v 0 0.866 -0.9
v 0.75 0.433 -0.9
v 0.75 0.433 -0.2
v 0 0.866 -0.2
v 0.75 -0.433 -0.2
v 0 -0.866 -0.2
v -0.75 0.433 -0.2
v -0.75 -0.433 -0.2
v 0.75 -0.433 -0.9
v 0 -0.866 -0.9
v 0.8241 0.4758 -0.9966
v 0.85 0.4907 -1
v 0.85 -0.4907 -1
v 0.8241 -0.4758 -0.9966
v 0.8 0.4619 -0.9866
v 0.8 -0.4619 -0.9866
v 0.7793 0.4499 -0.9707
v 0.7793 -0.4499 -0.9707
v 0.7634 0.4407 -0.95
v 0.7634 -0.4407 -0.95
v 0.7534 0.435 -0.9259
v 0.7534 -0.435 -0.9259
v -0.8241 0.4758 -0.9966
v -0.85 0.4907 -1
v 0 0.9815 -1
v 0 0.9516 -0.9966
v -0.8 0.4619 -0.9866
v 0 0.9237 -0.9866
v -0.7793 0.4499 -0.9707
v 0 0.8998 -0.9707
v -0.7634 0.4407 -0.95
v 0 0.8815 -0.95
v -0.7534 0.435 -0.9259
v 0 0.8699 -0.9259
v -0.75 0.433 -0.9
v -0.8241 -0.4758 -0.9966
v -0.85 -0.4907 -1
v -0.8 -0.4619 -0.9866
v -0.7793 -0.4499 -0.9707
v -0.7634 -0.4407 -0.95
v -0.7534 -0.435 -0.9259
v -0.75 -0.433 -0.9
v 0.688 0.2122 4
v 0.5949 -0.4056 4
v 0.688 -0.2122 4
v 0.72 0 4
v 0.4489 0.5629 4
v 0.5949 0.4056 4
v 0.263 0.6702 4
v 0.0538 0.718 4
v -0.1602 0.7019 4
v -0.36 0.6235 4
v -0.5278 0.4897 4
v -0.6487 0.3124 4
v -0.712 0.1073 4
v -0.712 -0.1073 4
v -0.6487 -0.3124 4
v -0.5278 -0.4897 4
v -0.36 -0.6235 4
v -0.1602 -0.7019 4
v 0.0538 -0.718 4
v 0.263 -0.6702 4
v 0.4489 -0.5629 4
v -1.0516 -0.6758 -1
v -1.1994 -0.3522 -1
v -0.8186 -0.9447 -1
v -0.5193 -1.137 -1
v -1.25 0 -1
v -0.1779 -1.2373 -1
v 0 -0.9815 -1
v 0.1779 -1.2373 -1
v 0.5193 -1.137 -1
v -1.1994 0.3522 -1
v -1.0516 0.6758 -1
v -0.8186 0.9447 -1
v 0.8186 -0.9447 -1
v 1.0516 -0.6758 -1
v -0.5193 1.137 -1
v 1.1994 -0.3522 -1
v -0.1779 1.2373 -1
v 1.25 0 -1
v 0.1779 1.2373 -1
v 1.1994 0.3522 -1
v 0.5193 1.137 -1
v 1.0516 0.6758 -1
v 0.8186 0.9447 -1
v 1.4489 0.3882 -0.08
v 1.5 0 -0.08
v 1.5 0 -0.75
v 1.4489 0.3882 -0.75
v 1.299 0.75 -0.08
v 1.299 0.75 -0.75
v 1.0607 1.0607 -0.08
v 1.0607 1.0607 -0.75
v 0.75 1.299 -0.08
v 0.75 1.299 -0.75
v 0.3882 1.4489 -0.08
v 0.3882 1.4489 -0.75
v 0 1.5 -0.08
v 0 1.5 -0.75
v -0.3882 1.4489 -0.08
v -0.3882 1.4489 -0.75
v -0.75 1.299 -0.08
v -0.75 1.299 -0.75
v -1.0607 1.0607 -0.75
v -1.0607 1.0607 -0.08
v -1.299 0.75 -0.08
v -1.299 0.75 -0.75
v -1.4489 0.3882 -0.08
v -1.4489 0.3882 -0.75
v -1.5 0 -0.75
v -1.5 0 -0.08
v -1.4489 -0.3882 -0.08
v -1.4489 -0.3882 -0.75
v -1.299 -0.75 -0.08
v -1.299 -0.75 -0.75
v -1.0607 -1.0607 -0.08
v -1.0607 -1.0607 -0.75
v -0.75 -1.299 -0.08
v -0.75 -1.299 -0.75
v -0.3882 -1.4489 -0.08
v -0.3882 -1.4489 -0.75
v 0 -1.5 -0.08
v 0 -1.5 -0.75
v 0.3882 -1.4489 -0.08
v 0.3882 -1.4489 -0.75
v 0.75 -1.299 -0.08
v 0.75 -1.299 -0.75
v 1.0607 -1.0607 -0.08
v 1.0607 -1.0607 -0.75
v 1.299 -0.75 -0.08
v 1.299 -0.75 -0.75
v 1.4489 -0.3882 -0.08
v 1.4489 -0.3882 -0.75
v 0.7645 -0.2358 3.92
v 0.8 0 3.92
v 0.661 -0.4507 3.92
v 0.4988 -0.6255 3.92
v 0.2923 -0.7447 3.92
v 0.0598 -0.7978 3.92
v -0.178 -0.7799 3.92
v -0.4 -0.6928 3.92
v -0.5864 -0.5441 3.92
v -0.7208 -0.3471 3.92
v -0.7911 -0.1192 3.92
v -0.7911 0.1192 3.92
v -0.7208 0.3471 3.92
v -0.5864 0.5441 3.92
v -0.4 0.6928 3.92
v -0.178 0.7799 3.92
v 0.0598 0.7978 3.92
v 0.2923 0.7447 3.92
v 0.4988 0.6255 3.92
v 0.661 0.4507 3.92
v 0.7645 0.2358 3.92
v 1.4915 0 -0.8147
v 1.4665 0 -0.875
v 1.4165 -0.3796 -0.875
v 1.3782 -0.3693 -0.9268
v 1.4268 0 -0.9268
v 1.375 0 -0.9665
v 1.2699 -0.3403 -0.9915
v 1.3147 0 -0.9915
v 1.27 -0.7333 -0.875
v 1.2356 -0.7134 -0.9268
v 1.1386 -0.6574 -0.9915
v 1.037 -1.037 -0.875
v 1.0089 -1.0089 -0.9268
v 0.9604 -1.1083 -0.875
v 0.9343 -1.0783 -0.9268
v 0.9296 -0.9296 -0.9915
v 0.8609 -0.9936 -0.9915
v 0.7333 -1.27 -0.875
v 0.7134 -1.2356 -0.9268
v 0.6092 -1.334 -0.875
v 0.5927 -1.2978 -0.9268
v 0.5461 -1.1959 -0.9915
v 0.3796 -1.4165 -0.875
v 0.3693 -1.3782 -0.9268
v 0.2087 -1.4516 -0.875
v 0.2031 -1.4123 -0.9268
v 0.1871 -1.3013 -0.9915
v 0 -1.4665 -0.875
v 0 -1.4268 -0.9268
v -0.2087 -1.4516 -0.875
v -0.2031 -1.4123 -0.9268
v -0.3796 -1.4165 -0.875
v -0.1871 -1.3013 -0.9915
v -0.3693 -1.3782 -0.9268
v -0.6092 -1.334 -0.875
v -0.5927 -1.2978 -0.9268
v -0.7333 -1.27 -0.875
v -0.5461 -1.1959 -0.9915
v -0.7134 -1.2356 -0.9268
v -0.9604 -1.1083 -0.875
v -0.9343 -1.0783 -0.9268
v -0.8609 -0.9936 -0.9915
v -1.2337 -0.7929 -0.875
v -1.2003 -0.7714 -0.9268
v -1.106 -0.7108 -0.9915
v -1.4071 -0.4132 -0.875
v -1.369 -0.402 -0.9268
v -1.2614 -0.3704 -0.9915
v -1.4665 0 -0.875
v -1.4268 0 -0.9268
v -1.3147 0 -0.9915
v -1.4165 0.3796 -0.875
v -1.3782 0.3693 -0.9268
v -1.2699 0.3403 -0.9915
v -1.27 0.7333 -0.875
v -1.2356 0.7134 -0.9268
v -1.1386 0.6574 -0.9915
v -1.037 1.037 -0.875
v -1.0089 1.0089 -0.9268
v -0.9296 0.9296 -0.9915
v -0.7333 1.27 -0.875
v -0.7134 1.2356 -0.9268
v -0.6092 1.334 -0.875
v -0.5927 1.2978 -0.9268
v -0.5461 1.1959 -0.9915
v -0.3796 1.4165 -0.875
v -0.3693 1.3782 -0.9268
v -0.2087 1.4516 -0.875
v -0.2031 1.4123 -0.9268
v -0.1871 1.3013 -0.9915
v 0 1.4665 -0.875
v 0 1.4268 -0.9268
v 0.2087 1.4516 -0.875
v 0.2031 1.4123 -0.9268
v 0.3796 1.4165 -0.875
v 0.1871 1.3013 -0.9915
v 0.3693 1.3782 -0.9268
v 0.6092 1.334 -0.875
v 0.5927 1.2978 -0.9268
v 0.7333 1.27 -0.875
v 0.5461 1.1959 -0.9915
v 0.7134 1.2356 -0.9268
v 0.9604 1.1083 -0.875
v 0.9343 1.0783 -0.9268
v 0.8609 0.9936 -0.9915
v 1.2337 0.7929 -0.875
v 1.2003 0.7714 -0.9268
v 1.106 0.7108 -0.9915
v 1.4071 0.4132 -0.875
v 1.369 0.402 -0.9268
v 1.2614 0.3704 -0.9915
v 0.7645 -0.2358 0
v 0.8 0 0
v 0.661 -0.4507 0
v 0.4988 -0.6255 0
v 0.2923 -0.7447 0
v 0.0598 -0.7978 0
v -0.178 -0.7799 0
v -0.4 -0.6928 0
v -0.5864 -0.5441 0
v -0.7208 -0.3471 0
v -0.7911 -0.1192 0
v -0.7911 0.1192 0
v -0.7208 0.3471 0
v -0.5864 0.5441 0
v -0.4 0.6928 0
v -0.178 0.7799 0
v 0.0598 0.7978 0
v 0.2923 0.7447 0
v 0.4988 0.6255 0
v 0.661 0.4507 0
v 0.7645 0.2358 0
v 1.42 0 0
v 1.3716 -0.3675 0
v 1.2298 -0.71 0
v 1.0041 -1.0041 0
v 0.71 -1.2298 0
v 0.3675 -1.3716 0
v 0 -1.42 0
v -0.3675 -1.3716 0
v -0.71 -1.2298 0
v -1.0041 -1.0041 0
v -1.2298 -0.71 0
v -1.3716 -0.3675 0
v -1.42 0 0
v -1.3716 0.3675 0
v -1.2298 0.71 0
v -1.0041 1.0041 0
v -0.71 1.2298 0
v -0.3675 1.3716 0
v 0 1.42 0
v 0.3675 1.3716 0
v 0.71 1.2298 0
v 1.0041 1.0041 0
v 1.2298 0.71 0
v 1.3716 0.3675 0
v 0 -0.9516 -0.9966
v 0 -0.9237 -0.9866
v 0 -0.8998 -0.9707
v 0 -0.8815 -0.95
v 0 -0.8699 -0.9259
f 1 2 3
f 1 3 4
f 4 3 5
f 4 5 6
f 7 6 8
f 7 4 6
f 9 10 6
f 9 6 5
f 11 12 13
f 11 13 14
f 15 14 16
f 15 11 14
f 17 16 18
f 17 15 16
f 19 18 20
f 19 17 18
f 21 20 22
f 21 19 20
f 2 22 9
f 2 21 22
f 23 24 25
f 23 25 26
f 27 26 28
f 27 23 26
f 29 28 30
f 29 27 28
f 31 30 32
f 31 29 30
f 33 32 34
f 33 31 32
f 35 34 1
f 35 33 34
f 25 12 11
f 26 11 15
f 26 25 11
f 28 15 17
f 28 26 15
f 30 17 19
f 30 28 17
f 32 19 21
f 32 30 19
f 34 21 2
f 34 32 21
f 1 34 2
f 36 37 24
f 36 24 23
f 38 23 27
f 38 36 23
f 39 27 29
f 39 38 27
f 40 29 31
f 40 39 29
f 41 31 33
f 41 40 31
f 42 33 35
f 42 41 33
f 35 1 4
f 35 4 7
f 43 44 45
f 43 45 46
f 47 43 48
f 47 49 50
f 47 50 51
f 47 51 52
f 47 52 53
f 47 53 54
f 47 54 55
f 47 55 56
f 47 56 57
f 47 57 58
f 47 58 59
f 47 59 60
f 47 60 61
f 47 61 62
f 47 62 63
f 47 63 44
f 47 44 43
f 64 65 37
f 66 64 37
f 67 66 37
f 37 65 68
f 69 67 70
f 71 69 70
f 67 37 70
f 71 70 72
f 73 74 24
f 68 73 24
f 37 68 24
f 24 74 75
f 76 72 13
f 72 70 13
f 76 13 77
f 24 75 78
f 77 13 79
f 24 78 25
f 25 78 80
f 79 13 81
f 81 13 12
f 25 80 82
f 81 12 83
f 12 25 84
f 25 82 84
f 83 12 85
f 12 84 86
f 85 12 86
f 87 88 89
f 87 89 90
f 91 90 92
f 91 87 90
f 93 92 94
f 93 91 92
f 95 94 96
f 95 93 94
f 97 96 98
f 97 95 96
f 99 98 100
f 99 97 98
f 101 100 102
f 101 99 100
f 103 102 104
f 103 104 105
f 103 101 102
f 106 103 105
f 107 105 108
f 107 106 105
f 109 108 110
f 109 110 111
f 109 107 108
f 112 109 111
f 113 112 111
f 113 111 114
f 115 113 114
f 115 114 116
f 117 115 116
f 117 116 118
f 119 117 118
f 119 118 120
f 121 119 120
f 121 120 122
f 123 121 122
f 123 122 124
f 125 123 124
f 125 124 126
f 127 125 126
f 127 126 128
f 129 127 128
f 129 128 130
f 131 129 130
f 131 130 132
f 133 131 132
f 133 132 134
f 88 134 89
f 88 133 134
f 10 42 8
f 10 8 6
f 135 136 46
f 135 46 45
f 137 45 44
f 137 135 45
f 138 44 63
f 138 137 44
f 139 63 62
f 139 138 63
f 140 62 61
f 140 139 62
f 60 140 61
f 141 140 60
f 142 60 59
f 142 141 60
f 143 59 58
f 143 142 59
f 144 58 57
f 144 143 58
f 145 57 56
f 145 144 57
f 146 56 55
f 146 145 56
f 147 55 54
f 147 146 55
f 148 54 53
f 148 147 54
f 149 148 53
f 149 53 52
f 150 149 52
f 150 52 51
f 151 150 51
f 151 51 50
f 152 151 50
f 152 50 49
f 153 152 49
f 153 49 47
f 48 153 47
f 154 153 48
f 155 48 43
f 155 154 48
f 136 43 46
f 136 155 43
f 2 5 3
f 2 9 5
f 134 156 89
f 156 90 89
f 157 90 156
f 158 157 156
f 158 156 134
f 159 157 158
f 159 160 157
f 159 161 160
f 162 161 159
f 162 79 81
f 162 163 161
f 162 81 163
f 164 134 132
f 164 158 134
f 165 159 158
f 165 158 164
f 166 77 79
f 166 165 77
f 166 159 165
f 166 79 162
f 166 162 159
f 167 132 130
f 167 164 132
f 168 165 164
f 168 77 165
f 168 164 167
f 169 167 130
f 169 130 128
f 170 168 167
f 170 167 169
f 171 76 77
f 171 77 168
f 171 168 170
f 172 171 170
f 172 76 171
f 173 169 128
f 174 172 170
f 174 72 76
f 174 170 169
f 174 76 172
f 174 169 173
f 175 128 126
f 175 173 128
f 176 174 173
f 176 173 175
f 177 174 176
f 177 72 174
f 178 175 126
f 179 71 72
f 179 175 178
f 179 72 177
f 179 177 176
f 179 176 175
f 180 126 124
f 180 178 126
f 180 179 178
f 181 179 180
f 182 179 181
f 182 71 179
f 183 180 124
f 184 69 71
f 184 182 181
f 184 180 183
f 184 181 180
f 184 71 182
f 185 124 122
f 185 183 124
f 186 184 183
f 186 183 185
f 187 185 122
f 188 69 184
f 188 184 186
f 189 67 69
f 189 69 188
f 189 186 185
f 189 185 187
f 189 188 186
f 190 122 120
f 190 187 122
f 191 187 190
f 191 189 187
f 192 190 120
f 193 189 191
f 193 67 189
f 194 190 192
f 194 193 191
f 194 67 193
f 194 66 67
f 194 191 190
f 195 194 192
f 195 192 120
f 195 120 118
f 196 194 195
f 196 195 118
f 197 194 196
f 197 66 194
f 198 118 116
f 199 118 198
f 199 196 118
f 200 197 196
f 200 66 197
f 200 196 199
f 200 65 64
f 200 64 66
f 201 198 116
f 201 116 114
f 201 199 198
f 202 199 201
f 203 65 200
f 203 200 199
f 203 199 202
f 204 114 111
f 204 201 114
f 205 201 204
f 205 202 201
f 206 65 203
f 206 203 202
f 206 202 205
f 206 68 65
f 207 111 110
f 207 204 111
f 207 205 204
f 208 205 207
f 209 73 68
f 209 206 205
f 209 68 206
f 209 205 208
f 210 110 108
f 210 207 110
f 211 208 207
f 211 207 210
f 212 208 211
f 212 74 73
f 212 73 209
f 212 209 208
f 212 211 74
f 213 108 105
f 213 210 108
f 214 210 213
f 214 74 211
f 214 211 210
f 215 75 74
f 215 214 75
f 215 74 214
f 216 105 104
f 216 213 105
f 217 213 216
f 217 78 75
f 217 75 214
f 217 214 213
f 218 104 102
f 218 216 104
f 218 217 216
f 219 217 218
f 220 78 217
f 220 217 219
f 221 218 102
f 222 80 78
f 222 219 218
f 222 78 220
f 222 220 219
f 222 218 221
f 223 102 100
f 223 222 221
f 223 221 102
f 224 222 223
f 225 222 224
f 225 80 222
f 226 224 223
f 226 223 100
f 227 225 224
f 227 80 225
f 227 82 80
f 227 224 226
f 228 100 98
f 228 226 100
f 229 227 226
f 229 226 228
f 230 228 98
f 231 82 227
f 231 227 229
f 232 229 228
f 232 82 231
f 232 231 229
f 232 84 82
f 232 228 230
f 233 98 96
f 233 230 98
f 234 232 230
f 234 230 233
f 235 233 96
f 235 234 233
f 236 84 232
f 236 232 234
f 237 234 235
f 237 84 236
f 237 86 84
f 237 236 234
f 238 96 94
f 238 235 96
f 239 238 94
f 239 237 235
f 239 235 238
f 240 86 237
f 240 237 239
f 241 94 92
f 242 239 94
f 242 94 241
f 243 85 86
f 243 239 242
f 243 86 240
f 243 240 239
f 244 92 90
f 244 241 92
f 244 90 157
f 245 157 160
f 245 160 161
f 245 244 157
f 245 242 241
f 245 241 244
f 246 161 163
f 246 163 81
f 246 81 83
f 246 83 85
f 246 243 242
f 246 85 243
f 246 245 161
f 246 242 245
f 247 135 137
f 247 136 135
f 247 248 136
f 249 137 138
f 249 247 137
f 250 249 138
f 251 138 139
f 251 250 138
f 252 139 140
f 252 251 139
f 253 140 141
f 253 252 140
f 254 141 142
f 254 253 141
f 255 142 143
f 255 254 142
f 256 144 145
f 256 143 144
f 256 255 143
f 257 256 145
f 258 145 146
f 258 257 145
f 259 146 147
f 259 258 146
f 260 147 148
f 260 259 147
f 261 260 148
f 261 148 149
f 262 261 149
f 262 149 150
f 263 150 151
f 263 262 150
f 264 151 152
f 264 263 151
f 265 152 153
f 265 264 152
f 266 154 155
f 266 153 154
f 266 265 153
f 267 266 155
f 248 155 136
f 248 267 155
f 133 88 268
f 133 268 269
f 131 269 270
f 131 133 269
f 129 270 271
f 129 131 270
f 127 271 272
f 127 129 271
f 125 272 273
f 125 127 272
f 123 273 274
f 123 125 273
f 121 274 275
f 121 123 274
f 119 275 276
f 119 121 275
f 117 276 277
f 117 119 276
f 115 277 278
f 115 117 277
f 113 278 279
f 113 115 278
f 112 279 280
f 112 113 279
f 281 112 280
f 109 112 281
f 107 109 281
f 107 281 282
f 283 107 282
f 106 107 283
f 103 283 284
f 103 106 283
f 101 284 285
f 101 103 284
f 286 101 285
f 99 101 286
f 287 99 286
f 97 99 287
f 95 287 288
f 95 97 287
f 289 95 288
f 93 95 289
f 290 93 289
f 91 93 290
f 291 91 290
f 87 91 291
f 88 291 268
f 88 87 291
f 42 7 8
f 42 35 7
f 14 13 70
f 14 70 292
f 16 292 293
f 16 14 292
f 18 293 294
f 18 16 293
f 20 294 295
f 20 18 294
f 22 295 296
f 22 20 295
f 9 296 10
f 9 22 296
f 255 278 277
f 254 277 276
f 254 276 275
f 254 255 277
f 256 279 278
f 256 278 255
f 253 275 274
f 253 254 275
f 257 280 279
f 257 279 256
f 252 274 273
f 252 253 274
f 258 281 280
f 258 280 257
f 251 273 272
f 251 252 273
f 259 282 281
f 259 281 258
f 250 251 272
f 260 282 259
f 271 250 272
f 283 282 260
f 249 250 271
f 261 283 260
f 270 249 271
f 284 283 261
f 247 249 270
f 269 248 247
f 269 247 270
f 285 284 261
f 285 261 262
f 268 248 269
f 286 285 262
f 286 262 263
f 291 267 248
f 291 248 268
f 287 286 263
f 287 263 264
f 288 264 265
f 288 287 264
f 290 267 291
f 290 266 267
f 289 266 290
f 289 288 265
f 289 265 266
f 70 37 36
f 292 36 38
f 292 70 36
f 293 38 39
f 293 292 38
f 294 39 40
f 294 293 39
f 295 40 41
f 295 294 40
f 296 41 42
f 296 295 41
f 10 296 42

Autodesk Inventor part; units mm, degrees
ref_plane "YZ Plane" through (0, 0, 0) normal (1, 0, 0) x (0, 1, 0)
ref_plane "XZ Plane" through (0, 0, 0) normal (0, 1, 0) x (-1, 0, 0)
ref_plane "XY Plane" through (0, 0, 0) normal (0, 0, 1) x (1, 0, 0)
sketch "Sketch1" plane through (0, 0, 0) normal (0, 0, 1) x (1, 0, 0)
  circle A0 centre (0, 0) radius 0.8
  circle A1 centre (0, 0) radius 1.5
  dimension "d0" = 1.6
  dimension "d1" = 3
extrude "Extrusion1" add sketch "Sketch1" along normal blind 4 contours A0
extrude "Extrusion2" add sketch "Sketch1" against normal blind 1 contours A0 | A1
sketch "Sketch2" plane through (0, 0, -1) normal (0, 0, -1) x (-1, 0, 0)
  line L0 (-0.75, 0.433) -> (0, 0.866)
  line L1 (0, 0.866) -> (0.75, 0.433)
  line L2 (0.75, 0.433) -> (0.75, -0.433)
  line L3 (0.75, -0.433) -> (0, -0.866)
  line L4 (0, -0.866) -> (-0.75, -0.433)
  line L5 (-0.75, -0.433) -> (-0.75, 0.433)
  point P0 (0, 0)
  point P1 (0, 0)
  dimension "d6" = 1.5
extrude "Extrusion3" cut sketch "Sketch2" against normal blind 0.8
fillet "Fillet1" radius 0.25 1 edges at (-1.5, 0, -1)
fillet "Fillet1" radius 0.1 6 edges at (0.375, 0.6495, -1) (0.75, 0, -1) (0.375, -0.6495, -1) (-0.375, -0.6495, -1) (-0.75, 0, -1) (-0.375, 0.6495, -1)
thread "Thread1" size "M1.6x0.35" class "6g" standard "ANSI Metric M Profile" full length
chamfer "Chamfer1" distance 0.08 angle 45 2 edges at (-0.8, 0, 4) (-1.5, 0, 0)
properties part number "CNCT_STEEL_M1,6x4_Screw" material "Stainless Steel"
